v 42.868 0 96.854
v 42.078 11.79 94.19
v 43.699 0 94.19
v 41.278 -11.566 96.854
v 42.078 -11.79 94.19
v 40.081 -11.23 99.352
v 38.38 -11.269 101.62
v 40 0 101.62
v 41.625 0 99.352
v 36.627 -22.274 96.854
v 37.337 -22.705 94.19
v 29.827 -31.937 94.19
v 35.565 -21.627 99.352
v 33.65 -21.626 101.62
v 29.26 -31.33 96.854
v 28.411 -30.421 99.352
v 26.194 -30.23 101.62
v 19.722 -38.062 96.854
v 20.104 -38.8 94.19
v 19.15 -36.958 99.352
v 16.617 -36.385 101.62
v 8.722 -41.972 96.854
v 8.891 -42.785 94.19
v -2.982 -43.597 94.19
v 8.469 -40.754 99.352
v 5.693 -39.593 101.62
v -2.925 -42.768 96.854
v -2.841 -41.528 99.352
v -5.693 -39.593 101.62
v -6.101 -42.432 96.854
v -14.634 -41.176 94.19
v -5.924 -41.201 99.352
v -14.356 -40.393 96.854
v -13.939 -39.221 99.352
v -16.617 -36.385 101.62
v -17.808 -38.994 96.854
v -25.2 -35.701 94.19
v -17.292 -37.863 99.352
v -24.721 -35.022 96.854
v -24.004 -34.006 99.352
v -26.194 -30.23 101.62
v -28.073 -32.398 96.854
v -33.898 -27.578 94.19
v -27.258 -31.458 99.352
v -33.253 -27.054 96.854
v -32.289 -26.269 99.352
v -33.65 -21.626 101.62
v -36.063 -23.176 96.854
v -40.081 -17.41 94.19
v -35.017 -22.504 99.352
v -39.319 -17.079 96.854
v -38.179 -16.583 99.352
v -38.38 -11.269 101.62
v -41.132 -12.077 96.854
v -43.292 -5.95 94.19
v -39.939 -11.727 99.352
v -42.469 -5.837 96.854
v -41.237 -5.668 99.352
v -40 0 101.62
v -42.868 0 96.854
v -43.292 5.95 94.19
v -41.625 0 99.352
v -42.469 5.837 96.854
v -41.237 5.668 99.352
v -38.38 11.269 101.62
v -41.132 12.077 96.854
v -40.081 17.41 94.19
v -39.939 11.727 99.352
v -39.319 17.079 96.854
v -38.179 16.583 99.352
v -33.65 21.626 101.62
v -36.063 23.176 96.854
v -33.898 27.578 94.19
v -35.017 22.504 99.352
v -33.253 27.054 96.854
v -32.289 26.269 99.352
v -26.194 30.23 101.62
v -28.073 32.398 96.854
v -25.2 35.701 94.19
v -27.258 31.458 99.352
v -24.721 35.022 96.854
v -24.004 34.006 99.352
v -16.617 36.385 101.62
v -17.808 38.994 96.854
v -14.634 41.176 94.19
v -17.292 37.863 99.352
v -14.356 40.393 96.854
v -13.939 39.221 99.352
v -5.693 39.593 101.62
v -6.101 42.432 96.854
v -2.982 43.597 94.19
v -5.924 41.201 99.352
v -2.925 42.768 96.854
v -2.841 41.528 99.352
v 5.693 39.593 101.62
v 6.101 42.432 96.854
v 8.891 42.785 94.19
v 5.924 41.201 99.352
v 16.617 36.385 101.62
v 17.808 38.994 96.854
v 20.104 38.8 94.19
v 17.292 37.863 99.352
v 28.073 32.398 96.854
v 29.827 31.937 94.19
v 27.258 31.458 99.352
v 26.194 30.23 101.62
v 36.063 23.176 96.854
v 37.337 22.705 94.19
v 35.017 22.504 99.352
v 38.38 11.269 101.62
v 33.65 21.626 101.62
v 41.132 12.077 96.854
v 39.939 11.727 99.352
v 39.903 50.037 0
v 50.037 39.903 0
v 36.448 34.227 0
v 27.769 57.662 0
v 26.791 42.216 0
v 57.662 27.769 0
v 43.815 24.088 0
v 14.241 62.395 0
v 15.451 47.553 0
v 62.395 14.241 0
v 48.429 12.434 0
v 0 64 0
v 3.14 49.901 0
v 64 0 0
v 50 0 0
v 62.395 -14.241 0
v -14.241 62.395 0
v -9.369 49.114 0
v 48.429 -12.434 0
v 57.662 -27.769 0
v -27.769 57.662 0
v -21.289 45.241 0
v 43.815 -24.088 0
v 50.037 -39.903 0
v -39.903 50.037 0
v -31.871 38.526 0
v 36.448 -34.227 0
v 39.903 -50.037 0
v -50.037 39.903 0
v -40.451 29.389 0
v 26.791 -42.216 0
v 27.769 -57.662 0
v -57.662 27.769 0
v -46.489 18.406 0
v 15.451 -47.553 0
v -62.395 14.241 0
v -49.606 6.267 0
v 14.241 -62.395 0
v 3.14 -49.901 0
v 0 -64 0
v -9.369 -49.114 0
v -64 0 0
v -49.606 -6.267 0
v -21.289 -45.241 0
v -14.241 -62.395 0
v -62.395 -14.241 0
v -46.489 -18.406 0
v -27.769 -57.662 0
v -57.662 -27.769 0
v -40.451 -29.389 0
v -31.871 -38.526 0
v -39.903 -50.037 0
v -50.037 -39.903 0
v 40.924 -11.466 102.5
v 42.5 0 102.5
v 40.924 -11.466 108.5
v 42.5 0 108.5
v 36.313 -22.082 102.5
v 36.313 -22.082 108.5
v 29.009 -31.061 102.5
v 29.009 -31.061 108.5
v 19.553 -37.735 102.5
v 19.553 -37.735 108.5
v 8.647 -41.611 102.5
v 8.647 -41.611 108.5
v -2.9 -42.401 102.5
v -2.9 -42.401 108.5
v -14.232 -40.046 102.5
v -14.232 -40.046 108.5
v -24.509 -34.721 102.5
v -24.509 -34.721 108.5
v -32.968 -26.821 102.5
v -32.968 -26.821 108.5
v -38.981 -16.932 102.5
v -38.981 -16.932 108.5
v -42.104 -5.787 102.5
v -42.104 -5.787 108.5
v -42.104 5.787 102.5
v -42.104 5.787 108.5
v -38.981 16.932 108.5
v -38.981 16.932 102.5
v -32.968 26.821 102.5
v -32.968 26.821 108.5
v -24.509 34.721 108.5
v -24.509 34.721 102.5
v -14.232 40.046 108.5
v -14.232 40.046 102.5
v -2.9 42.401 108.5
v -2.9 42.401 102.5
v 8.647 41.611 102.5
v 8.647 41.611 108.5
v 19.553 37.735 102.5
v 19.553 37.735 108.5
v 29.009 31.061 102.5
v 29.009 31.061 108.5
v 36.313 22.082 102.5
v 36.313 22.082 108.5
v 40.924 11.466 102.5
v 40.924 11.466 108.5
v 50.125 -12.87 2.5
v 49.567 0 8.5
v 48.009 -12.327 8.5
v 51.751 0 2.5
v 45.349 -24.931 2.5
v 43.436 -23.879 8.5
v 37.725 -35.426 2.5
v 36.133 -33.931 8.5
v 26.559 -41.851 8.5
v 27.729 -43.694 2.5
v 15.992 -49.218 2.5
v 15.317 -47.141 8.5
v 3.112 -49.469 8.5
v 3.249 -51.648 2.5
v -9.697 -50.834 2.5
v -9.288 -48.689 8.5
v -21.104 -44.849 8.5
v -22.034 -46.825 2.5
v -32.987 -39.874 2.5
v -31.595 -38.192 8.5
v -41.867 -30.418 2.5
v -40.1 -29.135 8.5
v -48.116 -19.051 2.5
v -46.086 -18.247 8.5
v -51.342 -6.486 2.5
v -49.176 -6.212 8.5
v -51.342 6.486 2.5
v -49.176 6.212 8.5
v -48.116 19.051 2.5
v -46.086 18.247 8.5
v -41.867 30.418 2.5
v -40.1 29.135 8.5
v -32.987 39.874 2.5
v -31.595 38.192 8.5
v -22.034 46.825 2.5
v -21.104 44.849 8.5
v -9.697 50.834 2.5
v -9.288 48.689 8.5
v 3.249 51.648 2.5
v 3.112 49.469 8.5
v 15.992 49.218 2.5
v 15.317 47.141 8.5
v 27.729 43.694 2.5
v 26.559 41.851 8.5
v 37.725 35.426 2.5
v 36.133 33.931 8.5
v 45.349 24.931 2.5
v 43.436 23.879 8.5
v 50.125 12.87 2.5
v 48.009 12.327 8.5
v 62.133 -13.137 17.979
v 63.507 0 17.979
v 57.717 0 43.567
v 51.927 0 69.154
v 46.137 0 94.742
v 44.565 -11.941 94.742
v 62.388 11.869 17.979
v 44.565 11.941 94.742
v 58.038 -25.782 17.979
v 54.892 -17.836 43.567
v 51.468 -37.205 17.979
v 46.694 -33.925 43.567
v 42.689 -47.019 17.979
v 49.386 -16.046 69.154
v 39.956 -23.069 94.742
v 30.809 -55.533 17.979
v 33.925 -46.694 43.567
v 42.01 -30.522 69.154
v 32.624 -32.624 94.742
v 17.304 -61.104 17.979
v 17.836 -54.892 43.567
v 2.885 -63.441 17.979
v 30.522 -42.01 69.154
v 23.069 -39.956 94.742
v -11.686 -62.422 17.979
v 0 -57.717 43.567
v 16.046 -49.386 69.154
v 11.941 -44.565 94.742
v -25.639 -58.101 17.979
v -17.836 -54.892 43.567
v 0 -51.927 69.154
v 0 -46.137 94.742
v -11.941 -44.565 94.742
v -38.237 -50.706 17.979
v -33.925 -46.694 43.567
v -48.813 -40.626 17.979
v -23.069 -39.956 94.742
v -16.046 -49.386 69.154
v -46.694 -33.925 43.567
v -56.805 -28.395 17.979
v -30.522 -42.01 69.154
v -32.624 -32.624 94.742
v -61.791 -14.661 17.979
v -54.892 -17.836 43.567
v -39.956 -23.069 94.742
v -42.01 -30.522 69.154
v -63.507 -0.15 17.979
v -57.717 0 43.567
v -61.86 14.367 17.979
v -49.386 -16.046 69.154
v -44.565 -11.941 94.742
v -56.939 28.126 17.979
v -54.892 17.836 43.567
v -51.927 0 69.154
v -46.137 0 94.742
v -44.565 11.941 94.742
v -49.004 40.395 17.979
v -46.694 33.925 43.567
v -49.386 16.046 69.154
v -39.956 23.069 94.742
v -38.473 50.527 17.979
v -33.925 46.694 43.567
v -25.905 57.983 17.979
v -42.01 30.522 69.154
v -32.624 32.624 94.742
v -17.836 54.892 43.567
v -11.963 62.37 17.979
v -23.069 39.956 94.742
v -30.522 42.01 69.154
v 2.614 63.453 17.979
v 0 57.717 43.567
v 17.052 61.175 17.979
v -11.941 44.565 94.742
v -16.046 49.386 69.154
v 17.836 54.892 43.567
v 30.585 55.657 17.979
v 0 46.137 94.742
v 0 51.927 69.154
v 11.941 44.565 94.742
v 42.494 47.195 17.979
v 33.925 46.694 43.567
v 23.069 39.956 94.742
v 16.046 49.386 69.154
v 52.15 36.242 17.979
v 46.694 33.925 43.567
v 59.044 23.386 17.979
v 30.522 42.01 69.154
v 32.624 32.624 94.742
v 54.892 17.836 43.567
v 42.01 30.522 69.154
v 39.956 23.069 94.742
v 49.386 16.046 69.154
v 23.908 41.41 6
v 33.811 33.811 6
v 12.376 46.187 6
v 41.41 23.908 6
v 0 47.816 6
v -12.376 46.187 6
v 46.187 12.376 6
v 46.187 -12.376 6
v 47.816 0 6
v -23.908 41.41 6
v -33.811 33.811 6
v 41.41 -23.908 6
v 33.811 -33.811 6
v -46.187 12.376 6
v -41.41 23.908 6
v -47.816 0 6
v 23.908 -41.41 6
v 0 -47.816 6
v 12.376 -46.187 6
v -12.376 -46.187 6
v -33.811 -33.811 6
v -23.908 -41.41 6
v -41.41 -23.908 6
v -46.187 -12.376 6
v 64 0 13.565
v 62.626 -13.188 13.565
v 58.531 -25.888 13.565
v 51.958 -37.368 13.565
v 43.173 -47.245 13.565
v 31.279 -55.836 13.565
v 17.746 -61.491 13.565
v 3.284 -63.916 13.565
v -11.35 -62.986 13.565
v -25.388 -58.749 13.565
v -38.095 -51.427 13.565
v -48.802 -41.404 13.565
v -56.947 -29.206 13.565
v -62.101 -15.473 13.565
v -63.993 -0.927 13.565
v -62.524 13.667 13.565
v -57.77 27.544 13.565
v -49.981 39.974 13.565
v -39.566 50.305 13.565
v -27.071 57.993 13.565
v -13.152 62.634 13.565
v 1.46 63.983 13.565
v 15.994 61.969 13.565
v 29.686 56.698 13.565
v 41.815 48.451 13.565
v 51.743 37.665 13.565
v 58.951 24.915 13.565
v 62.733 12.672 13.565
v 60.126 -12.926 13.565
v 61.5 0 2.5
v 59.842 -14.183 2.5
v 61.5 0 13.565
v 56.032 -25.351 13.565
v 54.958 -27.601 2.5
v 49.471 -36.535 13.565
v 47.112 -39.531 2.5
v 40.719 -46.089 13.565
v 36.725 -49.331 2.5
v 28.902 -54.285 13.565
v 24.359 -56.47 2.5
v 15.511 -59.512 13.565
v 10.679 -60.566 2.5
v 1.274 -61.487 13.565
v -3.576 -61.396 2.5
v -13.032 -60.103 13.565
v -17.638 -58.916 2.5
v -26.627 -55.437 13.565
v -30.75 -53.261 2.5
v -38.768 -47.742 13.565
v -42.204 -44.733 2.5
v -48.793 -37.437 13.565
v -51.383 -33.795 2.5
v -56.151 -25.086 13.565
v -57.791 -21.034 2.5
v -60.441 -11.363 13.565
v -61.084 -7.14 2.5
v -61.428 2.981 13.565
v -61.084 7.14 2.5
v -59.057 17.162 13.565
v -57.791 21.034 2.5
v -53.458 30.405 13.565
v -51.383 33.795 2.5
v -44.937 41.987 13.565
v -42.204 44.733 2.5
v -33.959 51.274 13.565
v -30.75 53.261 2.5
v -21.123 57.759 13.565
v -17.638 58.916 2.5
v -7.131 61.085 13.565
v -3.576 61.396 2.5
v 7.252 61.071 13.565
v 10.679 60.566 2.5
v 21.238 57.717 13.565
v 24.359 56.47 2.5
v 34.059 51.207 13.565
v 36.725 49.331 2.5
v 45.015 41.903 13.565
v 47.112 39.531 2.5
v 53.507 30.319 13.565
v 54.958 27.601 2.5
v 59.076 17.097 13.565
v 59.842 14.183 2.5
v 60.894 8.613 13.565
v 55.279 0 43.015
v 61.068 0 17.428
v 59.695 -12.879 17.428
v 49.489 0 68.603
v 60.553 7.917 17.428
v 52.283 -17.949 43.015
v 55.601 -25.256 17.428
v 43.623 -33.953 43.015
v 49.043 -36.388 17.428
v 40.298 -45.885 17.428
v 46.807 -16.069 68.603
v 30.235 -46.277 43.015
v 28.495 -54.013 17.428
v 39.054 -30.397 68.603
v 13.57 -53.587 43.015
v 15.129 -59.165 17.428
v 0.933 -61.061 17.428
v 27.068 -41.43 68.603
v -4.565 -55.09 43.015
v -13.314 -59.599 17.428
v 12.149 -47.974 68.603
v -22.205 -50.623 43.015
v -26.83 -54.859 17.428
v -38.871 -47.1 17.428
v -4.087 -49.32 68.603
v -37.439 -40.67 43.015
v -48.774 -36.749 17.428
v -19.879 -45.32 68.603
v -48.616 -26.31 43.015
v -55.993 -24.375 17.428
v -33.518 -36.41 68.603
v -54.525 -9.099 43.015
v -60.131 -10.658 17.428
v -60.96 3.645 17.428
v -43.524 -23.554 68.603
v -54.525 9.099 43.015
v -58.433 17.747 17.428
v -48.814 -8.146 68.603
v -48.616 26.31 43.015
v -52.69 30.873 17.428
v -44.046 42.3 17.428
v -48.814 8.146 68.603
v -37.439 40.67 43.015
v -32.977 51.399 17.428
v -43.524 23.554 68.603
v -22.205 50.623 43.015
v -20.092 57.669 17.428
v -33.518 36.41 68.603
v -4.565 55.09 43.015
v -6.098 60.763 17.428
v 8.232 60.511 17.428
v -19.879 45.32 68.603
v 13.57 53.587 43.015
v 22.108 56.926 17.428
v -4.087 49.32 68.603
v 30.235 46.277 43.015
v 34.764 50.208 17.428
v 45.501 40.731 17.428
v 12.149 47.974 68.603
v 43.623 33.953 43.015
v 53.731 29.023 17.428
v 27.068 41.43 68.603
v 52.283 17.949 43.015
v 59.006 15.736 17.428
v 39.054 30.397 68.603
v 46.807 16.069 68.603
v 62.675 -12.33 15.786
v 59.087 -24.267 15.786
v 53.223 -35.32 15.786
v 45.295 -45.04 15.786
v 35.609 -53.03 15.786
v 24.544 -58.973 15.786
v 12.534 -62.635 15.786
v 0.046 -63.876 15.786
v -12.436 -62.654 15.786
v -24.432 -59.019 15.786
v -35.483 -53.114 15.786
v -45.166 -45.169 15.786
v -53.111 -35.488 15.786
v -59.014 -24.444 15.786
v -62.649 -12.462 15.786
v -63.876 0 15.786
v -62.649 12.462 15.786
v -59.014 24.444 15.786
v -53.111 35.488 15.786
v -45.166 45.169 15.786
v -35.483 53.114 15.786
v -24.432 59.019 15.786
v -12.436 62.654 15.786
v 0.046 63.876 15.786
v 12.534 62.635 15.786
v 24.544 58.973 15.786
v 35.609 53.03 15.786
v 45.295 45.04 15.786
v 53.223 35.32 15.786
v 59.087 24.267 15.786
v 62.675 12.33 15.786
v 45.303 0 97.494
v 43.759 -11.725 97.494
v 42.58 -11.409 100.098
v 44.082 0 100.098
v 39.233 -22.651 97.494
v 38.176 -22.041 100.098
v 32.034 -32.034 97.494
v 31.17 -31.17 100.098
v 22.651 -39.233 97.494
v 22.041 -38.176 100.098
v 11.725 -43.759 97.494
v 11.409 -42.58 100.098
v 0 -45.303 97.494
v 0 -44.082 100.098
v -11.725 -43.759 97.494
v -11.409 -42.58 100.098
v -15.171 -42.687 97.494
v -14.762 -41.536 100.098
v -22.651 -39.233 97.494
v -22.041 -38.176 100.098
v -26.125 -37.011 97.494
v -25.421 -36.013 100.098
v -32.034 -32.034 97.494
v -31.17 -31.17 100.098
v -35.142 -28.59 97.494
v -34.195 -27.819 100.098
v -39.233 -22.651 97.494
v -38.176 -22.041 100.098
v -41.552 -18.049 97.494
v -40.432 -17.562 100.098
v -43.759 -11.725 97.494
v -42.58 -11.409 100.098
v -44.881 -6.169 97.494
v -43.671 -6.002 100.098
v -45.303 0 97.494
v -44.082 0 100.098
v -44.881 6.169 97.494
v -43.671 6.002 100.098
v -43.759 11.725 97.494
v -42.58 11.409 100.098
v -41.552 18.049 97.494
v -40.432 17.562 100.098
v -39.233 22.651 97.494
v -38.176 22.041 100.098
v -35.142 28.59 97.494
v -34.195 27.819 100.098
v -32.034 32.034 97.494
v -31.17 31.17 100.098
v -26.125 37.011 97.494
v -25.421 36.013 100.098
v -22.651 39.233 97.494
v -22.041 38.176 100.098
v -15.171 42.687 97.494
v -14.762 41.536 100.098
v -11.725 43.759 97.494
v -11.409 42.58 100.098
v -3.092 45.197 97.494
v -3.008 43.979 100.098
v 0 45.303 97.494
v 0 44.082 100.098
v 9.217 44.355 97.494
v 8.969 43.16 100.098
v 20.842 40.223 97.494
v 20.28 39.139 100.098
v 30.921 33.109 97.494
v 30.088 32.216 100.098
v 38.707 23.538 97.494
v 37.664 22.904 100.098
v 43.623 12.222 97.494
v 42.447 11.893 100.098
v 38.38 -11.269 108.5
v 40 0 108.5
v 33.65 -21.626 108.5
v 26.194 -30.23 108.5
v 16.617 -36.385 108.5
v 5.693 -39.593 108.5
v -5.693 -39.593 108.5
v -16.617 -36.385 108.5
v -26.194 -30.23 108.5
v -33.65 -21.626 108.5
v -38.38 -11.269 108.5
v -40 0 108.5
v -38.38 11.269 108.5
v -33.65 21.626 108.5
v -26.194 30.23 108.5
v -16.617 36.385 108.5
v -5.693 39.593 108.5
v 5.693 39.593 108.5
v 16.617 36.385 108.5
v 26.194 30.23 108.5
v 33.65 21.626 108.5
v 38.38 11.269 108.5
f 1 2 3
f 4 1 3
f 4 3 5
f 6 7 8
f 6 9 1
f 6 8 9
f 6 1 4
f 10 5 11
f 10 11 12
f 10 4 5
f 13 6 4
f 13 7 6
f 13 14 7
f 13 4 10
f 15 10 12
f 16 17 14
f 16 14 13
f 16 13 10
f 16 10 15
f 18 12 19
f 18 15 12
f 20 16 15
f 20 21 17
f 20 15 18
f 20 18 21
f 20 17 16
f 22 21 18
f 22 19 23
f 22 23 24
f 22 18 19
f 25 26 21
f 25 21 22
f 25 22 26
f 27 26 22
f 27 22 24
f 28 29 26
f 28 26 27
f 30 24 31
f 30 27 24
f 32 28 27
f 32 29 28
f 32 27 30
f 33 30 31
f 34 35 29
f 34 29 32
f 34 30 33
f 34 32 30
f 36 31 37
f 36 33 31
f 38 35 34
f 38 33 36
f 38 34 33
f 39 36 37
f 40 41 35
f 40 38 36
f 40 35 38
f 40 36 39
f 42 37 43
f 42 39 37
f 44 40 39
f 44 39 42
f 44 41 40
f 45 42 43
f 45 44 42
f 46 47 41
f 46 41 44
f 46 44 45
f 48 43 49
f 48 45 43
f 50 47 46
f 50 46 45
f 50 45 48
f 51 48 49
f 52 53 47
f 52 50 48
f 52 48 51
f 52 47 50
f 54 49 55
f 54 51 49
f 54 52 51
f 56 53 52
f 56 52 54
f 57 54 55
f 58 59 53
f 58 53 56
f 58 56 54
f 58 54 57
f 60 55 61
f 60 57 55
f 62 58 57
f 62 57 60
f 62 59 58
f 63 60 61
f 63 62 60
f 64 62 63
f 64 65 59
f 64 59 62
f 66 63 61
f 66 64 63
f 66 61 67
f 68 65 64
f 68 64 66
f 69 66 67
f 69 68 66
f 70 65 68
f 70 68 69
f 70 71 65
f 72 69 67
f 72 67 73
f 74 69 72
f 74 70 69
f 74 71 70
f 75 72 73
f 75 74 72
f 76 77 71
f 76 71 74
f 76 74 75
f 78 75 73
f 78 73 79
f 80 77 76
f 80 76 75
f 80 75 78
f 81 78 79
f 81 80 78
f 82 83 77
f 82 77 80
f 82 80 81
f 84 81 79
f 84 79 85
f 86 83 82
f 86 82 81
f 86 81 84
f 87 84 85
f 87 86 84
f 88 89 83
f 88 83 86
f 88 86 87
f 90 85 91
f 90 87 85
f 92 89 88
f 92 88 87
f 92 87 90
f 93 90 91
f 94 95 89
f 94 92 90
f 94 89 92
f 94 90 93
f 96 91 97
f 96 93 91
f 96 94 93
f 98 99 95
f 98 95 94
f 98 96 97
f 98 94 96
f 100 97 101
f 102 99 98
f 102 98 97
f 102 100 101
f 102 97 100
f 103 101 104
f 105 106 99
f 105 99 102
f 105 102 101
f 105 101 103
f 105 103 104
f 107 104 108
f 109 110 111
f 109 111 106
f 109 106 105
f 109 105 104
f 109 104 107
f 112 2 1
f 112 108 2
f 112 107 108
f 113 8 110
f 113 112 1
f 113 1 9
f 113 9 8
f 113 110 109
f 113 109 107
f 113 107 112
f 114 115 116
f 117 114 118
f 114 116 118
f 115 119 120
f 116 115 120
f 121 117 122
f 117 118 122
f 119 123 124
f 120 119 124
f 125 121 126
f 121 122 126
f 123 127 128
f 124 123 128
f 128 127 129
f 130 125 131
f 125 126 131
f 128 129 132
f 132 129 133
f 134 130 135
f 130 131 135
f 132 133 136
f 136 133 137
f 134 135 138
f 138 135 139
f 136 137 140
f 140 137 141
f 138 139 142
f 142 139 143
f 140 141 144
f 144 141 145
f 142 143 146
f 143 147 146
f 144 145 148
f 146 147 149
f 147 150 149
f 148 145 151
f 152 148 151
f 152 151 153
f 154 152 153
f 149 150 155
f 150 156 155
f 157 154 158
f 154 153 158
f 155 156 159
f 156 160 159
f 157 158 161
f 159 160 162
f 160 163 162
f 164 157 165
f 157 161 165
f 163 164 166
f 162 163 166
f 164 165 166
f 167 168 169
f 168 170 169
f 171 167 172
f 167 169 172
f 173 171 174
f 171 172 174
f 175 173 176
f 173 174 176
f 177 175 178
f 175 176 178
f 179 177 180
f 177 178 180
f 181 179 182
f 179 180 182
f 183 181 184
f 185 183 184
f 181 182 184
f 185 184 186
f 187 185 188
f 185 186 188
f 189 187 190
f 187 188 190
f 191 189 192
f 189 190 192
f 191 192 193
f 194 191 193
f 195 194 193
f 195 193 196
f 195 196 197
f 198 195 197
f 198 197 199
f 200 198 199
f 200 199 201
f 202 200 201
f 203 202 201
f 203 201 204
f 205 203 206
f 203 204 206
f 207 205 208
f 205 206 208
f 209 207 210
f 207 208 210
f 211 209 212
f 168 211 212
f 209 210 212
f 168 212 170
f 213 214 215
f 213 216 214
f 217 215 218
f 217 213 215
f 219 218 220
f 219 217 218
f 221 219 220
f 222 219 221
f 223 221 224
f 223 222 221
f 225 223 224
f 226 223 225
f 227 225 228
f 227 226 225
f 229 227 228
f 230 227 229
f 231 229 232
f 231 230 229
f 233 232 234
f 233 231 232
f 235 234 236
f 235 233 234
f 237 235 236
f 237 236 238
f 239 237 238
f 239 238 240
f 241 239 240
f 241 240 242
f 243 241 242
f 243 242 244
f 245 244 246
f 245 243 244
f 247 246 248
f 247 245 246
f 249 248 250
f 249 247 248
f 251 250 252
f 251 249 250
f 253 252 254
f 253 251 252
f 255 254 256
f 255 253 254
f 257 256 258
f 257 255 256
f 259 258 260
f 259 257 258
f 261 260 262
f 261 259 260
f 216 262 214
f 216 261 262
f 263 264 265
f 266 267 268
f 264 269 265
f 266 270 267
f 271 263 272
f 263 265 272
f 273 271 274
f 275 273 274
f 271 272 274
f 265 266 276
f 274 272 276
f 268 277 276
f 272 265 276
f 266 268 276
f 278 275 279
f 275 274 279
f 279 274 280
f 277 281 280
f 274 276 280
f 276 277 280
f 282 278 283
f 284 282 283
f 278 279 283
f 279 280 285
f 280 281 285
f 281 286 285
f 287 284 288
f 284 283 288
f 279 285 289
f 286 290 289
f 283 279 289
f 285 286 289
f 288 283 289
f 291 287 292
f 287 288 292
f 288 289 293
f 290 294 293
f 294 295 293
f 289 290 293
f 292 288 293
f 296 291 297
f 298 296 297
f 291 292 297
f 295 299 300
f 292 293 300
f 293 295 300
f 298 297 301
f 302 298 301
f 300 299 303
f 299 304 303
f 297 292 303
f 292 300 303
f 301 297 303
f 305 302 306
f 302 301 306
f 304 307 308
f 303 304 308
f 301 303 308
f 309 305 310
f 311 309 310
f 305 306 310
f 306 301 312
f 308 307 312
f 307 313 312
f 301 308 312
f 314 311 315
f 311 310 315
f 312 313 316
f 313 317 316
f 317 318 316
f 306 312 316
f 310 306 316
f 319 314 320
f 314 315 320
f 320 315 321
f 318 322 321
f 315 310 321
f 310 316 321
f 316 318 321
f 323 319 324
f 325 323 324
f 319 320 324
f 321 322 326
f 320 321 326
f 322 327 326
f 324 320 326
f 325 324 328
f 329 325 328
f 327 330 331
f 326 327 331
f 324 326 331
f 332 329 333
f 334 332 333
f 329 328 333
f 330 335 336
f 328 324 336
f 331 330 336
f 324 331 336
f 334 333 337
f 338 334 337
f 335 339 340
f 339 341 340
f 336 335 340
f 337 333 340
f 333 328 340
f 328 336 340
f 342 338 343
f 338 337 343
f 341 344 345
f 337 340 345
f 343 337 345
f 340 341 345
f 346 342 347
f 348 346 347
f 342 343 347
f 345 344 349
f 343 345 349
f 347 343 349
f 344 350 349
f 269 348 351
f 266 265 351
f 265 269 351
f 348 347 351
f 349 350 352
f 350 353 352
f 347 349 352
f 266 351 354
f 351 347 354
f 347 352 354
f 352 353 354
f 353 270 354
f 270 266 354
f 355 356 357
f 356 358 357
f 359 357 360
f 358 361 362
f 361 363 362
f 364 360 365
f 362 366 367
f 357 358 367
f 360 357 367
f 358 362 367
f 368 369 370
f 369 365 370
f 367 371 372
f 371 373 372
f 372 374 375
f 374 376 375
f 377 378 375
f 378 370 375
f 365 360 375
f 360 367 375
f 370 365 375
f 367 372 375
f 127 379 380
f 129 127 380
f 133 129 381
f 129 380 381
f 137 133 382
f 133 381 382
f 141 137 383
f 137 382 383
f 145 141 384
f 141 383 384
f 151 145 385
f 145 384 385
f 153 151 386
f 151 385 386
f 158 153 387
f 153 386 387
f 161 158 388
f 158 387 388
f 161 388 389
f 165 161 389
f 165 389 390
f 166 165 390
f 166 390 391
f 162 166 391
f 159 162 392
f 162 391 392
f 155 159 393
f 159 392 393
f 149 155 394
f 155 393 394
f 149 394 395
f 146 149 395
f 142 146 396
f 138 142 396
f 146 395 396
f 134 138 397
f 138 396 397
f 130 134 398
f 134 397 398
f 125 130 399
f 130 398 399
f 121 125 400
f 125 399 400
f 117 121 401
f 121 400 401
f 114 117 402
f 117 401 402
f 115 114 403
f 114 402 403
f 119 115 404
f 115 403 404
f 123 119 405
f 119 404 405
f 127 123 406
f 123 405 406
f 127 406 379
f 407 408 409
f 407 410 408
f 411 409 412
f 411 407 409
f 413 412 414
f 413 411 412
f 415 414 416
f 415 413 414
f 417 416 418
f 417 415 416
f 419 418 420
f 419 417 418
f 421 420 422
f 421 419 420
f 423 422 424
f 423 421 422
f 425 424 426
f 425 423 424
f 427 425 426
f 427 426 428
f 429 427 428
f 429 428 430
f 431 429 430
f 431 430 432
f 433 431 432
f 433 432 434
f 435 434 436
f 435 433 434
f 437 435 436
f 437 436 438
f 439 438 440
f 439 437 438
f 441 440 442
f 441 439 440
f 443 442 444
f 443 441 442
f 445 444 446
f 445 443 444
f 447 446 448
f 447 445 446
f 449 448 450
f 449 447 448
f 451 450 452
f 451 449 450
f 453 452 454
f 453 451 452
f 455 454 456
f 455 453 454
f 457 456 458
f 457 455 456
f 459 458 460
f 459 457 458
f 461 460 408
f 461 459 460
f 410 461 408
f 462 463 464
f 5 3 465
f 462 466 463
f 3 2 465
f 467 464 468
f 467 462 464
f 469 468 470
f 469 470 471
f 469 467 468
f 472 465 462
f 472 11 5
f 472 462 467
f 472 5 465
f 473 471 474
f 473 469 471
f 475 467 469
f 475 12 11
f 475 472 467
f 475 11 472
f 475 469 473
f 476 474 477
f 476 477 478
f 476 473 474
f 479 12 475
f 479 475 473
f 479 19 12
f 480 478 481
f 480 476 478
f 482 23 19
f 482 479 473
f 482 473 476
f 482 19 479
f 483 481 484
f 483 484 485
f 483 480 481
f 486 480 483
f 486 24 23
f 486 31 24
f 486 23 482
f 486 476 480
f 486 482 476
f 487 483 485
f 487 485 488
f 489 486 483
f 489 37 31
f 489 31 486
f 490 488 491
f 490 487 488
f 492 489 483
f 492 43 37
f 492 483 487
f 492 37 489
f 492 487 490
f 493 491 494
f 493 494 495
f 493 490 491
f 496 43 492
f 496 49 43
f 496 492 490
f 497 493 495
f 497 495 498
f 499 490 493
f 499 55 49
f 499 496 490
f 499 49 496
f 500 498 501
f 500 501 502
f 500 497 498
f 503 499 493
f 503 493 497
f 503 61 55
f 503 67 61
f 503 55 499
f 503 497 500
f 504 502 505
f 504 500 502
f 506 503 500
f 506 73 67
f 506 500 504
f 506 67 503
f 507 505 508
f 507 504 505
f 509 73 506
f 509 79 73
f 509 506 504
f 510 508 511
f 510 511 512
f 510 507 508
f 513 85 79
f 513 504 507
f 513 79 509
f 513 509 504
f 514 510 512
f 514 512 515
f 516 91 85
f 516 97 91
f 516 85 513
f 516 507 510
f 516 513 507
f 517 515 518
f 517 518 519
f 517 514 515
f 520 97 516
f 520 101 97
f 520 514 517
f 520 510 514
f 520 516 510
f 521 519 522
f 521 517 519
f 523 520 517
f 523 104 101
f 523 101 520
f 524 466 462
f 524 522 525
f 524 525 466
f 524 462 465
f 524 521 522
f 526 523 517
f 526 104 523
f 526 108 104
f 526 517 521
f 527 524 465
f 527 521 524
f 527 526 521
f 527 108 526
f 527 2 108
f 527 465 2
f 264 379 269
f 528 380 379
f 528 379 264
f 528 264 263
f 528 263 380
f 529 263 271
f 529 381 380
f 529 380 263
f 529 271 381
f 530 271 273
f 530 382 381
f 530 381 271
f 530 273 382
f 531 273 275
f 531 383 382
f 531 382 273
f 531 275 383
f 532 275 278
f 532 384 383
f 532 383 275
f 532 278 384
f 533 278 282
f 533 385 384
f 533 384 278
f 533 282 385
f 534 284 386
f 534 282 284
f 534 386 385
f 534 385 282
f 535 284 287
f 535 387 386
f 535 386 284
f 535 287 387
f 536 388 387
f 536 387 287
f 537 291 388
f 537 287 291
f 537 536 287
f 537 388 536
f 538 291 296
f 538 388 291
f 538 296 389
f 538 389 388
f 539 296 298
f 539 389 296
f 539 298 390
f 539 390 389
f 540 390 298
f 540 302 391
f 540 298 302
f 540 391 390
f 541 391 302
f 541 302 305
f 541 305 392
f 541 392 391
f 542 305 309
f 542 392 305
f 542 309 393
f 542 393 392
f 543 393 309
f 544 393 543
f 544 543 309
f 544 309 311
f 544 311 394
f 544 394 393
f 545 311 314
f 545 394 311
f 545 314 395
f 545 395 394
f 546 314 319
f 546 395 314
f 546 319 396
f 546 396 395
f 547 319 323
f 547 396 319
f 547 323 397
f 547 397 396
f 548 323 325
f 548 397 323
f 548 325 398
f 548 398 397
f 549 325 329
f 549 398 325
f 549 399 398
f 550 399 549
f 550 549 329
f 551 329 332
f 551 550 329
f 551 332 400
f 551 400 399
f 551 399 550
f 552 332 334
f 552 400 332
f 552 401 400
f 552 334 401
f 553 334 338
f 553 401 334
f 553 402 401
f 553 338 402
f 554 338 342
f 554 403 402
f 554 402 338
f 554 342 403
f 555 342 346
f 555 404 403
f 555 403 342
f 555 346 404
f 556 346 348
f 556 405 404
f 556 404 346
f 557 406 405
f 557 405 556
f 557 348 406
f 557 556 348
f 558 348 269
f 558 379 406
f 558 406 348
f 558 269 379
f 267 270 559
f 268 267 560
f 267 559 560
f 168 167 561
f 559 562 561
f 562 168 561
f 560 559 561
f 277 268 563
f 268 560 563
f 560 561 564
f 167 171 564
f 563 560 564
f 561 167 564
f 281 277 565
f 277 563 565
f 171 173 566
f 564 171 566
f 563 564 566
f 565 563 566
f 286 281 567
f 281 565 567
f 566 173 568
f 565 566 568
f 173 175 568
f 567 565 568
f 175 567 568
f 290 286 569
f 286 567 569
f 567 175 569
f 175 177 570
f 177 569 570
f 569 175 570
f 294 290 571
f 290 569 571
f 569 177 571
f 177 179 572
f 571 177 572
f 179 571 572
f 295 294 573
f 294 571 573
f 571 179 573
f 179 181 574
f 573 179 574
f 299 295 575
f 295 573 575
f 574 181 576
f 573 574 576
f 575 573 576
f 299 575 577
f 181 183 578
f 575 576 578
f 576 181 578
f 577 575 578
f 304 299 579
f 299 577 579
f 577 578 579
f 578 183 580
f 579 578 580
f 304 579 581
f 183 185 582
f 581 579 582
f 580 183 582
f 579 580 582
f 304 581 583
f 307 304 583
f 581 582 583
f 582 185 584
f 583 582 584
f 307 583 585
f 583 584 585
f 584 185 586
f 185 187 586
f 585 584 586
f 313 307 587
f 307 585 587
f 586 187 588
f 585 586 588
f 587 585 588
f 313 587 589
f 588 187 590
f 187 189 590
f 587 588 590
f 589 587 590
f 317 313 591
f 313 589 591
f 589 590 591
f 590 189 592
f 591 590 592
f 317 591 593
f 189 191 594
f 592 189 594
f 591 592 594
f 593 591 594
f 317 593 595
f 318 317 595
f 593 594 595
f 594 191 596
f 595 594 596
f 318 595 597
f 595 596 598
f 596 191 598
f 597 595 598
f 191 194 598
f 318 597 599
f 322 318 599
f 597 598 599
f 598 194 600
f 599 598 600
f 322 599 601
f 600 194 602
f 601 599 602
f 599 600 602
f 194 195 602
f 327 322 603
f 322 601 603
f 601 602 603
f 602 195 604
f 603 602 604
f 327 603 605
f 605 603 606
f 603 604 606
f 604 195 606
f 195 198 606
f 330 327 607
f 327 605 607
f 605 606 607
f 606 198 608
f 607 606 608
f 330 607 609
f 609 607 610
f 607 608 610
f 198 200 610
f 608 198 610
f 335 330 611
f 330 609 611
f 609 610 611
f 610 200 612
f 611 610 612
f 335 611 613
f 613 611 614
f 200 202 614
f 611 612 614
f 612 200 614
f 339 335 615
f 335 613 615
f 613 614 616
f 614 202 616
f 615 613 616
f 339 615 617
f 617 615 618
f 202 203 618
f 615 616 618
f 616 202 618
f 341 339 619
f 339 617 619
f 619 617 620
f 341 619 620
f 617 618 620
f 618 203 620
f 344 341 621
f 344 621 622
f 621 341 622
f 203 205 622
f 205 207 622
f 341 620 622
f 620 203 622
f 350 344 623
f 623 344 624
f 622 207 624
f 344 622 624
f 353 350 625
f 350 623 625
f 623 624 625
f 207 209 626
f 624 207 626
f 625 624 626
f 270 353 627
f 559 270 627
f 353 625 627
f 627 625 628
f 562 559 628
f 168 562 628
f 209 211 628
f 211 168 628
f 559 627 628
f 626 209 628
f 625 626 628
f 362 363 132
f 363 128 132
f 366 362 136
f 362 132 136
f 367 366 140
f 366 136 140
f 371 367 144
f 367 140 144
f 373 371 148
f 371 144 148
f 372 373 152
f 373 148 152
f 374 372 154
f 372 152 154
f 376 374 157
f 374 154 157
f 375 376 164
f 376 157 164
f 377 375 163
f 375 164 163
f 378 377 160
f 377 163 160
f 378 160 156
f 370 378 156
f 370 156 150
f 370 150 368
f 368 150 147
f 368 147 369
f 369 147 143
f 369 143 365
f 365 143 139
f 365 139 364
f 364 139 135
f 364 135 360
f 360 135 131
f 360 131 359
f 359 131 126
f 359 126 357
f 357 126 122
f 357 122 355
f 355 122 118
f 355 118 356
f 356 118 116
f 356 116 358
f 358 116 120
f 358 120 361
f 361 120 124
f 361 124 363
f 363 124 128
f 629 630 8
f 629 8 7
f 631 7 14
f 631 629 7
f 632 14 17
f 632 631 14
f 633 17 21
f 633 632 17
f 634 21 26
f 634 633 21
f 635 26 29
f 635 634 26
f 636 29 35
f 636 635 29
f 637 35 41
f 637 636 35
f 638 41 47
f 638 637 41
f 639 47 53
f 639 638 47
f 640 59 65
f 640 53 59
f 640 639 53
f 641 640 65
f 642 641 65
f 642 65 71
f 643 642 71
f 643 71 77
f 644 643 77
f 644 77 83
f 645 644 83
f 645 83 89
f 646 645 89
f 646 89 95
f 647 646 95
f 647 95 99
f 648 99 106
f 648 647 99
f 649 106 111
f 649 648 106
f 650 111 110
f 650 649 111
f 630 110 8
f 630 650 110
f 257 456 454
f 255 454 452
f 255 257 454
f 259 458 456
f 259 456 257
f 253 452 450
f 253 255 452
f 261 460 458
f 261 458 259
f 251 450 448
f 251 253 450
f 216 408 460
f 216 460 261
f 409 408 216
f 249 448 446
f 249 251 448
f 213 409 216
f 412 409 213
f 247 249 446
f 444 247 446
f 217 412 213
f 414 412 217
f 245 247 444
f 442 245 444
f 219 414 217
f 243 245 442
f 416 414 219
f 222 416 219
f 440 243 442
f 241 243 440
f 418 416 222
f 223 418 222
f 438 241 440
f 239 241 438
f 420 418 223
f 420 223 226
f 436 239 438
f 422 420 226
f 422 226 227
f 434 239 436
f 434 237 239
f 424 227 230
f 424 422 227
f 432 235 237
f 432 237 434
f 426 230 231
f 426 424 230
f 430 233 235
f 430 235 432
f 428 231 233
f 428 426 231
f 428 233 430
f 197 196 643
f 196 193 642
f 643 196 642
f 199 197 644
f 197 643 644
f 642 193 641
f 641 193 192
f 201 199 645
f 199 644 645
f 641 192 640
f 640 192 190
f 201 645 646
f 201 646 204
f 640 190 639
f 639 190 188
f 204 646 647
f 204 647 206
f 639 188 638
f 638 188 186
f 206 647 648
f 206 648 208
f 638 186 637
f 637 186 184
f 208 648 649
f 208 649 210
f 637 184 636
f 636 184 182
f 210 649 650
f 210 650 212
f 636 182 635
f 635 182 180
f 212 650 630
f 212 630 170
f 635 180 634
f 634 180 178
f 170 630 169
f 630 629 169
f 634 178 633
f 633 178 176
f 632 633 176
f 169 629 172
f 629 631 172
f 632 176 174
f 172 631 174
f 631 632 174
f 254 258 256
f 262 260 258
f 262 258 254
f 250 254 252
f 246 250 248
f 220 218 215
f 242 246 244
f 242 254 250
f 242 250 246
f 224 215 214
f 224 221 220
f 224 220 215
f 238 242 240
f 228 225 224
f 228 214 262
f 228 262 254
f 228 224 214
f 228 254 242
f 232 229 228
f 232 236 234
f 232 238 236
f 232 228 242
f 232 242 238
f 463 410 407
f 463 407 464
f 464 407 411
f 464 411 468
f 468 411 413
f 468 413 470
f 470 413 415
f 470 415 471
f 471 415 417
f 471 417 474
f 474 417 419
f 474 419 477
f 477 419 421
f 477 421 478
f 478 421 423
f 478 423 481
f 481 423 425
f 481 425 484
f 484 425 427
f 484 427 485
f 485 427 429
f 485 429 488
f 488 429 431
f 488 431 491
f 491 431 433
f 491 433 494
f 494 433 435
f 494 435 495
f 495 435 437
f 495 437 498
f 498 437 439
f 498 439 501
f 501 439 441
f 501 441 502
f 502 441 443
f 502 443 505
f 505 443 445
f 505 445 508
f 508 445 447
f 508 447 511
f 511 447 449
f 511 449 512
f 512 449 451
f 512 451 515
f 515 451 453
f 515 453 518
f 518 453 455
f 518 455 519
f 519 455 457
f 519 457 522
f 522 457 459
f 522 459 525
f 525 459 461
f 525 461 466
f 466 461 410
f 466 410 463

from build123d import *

# Parameters (mm, degrees)
FILLET1_R = 20
SHELL1_T  = -2.5


with BuildPart() as part:
    # Sketch2 → Revolve1 (revolve)
    with BuildSketch(Plane(origin=(0, 0, 0), x_dir=(1, 0, 0), z_dir=(0, 1, 0))):
        with BuildLine():
            Line((0, -108.5), (0, -6))
            Line((0, -6), (47.816178594, -6))
            Line((47.816178594, -6), (50, 0))
            Line((50, 0), (64, 0))
            Line((64, 0), (64, -15.8))
            Line((64, -15.8), (46.137243112, -94.742026455))
            ThreePointArc((46.137243112, -94.742026455), (44.738953709, -98.818081472), (42.5, -102.5))
            Line((42.5, -102.5), (42.5, -108.5))
            Line((42.5, -108.5), (0, -108.5))
        make_face()
    revolve(axis=Axis((0, 0, 108.5), (0, 0, -1)))

    # Fillet1
    fillet1_edges = [part.edges().sort_by_distance(p)[0] for p in [
        (-64, 0, 15.8),
    ]]
    fillet(fillet1_edges, radius=FILLET1_R)

    # Shell1
    shell1_openings = [part.faces().sort_by_distance(p)[0] for p in [
        (0, 0, 108.5),
    ]]
    offset(amount=SHELL1_T, openings=shell1_openings, kind=Kind.INTERSECTION)


solid = part.part
